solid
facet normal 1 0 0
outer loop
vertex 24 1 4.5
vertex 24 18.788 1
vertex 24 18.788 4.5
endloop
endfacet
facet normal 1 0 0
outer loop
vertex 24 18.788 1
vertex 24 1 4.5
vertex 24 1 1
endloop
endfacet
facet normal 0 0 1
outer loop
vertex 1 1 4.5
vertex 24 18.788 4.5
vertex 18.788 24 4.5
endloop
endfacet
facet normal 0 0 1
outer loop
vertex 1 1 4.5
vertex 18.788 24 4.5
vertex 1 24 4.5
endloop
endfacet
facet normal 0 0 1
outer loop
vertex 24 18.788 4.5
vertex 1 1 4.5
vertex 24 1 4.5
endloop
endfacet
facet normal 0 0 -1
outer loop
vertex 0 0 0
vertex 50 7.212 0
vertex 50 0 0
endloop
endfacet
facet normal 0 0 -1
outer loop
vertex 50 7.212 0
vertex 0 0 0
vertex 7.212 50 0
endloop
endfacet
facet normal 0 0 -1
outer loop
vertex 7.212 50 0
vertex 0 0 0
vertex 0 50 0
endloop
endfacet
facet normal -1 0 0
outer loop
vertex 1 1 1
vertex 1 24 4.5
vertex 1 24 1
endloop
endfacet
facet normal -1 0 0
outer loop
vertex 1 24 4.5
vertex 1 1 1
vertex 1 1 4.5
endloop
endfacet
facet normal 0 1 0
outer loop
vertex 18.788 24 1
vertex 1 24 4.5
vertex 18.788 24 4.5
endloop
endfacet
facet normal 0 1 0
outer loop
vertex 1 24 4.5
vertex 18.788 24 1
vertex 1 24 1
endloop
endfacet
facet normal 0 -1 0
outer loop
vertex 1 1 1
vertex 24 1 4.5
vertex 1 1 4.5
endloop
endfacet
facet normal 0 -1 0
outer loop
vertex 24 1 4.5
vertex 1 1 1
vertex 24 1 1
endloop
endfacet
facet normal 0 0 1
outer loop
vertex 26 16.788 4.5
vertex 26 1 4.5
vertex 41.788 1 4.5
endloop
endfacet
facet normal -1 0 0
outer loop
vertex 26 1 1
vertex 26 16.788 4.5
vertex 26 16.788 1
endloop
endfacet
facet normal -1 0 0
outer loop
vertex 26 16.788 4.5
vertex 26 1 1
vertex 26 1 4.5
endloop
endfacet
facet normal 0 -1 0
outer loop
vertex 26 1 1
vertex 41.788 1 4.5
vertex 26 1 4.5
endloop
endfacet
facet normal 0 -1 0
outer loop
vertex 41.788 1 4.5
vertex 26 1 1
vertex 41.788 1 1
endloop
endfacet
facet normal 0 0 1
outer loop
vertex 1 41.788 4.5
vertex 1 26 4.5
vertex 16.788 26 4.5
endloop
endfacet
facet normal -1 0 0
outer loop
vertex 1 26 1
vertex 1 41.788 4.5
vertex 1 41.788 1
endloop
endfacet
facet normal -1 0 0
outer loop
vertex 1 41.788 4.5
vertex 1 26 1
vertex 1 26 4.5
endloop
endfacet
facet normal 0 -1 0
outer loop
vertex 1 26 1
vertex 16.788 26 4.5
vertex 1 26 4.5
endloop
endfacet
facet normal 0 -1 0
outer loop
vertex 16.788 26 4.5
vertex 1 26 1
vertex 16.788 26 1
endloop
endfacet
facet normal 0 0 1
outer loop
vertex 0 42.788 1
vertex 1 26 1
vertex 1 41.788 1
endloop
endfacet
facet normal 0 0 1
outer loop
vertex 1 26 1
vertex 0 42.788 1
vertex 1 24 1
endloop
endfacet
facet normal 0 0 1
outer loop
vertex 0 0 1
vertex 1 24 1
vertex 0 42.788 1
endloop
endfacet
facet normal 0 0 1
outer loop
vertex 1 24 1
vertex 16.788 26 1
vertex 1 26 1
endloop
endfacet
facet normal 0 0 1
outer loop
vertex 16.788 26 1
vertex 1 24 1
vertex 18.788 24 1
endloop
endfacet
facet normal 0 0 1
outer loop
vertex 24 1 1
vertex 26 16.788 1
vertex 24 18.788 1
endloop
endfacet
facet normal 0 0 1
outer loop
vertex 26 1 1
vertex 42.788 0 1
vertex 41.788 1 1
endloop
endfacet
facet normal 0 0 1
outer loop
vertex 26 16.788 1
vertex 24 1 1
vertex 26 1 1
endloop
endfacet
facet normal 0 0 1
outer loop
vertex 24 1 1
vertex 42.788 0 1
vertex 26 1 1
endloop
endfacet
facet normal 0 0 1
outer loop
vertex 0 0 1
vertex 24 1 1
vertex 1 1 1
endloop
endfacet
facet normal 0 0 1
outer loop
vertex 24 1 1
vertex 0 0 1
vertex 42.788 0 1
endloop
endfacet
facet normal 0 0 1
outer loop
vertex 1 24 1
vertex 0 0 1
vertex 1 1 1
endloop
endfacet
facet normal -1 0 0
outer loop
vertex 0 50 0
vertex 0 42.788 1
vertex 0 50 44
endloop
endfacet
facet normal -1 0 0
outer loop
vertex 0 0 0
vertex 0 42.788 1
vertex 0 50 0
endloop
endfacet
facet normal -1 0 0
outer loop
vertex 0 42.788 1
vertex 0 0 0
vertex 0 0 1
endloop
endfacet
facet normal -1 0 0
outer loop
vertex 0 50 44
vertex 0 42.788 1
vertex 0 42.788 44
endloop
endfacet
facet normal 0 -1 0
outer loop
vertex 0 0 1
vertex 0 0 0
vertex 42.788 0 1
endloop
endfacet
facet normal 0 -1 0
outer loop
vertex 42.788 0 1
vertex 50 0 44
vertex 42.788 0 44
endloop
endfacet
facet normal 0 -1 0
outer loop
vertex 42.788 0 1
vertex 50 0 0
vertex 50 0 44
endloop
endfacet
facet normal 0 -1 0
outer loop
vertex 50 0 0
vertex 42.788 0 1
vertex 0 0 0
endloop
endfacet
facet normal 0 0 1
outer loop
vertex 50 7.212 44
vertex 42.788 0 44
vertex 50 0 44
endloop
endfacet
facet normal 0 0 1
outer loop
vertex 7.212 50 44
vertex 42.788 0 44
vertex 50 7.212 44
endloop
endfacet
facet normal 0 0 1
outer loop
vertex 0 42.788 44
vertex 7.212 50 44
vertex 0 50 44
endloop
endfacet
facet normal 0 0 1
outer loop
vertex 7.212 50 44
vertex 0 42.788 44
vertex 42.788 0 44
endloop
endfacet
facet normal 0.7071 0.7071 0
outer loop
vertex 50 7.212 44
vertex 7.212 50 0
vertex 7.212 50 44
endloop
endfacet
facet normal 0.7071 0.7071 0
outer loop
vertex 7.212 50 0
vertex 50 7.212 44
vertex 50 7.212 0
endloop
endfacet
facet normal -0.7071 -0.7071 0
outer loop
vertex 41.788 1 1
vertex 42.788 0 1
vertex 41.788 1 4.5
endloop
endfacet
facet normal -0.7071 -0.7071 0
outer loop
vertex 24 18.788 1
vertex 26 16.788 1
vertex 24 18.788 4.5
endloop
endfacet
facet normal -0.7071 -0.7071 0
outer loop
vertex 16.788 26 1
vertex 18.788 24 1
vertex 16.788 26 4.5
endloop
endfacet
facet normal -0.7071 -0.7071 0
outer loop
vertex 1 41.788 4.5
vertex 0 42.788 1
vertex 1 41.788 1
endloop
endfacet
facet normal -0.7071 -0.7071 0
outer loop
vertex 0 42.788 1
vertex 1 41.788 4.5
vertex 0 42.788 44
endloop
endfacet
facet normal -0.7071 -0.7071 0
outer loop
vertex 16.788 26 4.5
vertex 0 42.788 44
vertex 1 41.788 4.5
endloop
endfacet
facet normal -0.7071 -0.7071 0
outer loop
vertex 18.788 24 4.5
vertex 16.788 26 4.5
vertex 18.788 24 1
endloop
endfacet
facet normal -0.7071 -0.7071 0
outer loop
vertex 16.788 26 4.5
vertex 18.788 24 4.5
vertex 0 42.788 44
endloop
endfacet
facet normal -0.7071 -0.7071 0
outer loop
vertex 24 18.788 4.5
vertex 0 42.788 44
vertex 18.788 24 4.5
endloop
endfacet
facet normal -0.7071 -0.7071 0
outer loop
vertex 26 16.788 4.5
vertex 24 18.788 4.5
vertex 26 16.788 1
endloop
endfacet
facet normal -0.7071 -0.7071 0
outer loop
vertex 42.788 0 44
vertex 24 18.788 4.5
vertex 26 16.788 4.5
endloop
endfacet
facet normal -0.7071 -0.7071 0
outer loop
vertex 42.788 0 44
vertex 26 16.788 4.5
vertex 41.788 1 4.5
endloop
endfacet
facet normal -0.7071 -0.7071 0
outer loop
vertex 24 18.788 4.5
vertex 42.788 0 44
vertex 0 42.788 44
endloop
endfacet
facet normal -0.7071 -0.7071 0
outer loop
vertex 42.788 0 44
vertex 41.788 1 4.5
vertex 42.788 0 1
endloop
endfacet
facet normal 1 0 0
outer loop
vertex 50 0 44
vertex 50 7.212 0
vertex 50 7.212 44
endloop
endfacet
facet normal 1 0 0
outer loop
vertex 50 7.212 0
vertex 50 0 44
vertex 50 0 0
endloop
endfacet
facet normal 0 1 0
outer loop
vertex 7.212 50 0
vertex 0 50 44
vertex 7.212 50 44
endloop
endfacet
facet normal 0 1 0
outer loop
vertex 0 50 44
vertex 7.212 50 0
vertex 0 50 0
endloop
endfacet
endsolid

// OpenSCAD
color("LightGray") {
    difference () {
        union() {
            translate([1,1,0]) cube([23,23,4.5]);
            translate([25+1,1,0]) cube([23,23,4.5]);
            translate([1,25+1,0]) cube([23,23,4.5]);
            translate([25+1,25+1,0]) cube([23,23,4.5]);
        }
        translate([50,0,-1]) rotate([0,0,45]) cube([75,75,50]);
    }
}
color("Grey") {
    difference() {
        cube([50,50,1]);
        translate([50,0,-1]) rotate([0,0,45]) cube([75,75,50]);
    }
    intersection() {
        translate([50+sqrt(10.2*10.2*2)/2,0,0]) rotate([0,0,90+45]) cube([80,10.2,50-6]);
        cube([50,50,50]);
    }
}
